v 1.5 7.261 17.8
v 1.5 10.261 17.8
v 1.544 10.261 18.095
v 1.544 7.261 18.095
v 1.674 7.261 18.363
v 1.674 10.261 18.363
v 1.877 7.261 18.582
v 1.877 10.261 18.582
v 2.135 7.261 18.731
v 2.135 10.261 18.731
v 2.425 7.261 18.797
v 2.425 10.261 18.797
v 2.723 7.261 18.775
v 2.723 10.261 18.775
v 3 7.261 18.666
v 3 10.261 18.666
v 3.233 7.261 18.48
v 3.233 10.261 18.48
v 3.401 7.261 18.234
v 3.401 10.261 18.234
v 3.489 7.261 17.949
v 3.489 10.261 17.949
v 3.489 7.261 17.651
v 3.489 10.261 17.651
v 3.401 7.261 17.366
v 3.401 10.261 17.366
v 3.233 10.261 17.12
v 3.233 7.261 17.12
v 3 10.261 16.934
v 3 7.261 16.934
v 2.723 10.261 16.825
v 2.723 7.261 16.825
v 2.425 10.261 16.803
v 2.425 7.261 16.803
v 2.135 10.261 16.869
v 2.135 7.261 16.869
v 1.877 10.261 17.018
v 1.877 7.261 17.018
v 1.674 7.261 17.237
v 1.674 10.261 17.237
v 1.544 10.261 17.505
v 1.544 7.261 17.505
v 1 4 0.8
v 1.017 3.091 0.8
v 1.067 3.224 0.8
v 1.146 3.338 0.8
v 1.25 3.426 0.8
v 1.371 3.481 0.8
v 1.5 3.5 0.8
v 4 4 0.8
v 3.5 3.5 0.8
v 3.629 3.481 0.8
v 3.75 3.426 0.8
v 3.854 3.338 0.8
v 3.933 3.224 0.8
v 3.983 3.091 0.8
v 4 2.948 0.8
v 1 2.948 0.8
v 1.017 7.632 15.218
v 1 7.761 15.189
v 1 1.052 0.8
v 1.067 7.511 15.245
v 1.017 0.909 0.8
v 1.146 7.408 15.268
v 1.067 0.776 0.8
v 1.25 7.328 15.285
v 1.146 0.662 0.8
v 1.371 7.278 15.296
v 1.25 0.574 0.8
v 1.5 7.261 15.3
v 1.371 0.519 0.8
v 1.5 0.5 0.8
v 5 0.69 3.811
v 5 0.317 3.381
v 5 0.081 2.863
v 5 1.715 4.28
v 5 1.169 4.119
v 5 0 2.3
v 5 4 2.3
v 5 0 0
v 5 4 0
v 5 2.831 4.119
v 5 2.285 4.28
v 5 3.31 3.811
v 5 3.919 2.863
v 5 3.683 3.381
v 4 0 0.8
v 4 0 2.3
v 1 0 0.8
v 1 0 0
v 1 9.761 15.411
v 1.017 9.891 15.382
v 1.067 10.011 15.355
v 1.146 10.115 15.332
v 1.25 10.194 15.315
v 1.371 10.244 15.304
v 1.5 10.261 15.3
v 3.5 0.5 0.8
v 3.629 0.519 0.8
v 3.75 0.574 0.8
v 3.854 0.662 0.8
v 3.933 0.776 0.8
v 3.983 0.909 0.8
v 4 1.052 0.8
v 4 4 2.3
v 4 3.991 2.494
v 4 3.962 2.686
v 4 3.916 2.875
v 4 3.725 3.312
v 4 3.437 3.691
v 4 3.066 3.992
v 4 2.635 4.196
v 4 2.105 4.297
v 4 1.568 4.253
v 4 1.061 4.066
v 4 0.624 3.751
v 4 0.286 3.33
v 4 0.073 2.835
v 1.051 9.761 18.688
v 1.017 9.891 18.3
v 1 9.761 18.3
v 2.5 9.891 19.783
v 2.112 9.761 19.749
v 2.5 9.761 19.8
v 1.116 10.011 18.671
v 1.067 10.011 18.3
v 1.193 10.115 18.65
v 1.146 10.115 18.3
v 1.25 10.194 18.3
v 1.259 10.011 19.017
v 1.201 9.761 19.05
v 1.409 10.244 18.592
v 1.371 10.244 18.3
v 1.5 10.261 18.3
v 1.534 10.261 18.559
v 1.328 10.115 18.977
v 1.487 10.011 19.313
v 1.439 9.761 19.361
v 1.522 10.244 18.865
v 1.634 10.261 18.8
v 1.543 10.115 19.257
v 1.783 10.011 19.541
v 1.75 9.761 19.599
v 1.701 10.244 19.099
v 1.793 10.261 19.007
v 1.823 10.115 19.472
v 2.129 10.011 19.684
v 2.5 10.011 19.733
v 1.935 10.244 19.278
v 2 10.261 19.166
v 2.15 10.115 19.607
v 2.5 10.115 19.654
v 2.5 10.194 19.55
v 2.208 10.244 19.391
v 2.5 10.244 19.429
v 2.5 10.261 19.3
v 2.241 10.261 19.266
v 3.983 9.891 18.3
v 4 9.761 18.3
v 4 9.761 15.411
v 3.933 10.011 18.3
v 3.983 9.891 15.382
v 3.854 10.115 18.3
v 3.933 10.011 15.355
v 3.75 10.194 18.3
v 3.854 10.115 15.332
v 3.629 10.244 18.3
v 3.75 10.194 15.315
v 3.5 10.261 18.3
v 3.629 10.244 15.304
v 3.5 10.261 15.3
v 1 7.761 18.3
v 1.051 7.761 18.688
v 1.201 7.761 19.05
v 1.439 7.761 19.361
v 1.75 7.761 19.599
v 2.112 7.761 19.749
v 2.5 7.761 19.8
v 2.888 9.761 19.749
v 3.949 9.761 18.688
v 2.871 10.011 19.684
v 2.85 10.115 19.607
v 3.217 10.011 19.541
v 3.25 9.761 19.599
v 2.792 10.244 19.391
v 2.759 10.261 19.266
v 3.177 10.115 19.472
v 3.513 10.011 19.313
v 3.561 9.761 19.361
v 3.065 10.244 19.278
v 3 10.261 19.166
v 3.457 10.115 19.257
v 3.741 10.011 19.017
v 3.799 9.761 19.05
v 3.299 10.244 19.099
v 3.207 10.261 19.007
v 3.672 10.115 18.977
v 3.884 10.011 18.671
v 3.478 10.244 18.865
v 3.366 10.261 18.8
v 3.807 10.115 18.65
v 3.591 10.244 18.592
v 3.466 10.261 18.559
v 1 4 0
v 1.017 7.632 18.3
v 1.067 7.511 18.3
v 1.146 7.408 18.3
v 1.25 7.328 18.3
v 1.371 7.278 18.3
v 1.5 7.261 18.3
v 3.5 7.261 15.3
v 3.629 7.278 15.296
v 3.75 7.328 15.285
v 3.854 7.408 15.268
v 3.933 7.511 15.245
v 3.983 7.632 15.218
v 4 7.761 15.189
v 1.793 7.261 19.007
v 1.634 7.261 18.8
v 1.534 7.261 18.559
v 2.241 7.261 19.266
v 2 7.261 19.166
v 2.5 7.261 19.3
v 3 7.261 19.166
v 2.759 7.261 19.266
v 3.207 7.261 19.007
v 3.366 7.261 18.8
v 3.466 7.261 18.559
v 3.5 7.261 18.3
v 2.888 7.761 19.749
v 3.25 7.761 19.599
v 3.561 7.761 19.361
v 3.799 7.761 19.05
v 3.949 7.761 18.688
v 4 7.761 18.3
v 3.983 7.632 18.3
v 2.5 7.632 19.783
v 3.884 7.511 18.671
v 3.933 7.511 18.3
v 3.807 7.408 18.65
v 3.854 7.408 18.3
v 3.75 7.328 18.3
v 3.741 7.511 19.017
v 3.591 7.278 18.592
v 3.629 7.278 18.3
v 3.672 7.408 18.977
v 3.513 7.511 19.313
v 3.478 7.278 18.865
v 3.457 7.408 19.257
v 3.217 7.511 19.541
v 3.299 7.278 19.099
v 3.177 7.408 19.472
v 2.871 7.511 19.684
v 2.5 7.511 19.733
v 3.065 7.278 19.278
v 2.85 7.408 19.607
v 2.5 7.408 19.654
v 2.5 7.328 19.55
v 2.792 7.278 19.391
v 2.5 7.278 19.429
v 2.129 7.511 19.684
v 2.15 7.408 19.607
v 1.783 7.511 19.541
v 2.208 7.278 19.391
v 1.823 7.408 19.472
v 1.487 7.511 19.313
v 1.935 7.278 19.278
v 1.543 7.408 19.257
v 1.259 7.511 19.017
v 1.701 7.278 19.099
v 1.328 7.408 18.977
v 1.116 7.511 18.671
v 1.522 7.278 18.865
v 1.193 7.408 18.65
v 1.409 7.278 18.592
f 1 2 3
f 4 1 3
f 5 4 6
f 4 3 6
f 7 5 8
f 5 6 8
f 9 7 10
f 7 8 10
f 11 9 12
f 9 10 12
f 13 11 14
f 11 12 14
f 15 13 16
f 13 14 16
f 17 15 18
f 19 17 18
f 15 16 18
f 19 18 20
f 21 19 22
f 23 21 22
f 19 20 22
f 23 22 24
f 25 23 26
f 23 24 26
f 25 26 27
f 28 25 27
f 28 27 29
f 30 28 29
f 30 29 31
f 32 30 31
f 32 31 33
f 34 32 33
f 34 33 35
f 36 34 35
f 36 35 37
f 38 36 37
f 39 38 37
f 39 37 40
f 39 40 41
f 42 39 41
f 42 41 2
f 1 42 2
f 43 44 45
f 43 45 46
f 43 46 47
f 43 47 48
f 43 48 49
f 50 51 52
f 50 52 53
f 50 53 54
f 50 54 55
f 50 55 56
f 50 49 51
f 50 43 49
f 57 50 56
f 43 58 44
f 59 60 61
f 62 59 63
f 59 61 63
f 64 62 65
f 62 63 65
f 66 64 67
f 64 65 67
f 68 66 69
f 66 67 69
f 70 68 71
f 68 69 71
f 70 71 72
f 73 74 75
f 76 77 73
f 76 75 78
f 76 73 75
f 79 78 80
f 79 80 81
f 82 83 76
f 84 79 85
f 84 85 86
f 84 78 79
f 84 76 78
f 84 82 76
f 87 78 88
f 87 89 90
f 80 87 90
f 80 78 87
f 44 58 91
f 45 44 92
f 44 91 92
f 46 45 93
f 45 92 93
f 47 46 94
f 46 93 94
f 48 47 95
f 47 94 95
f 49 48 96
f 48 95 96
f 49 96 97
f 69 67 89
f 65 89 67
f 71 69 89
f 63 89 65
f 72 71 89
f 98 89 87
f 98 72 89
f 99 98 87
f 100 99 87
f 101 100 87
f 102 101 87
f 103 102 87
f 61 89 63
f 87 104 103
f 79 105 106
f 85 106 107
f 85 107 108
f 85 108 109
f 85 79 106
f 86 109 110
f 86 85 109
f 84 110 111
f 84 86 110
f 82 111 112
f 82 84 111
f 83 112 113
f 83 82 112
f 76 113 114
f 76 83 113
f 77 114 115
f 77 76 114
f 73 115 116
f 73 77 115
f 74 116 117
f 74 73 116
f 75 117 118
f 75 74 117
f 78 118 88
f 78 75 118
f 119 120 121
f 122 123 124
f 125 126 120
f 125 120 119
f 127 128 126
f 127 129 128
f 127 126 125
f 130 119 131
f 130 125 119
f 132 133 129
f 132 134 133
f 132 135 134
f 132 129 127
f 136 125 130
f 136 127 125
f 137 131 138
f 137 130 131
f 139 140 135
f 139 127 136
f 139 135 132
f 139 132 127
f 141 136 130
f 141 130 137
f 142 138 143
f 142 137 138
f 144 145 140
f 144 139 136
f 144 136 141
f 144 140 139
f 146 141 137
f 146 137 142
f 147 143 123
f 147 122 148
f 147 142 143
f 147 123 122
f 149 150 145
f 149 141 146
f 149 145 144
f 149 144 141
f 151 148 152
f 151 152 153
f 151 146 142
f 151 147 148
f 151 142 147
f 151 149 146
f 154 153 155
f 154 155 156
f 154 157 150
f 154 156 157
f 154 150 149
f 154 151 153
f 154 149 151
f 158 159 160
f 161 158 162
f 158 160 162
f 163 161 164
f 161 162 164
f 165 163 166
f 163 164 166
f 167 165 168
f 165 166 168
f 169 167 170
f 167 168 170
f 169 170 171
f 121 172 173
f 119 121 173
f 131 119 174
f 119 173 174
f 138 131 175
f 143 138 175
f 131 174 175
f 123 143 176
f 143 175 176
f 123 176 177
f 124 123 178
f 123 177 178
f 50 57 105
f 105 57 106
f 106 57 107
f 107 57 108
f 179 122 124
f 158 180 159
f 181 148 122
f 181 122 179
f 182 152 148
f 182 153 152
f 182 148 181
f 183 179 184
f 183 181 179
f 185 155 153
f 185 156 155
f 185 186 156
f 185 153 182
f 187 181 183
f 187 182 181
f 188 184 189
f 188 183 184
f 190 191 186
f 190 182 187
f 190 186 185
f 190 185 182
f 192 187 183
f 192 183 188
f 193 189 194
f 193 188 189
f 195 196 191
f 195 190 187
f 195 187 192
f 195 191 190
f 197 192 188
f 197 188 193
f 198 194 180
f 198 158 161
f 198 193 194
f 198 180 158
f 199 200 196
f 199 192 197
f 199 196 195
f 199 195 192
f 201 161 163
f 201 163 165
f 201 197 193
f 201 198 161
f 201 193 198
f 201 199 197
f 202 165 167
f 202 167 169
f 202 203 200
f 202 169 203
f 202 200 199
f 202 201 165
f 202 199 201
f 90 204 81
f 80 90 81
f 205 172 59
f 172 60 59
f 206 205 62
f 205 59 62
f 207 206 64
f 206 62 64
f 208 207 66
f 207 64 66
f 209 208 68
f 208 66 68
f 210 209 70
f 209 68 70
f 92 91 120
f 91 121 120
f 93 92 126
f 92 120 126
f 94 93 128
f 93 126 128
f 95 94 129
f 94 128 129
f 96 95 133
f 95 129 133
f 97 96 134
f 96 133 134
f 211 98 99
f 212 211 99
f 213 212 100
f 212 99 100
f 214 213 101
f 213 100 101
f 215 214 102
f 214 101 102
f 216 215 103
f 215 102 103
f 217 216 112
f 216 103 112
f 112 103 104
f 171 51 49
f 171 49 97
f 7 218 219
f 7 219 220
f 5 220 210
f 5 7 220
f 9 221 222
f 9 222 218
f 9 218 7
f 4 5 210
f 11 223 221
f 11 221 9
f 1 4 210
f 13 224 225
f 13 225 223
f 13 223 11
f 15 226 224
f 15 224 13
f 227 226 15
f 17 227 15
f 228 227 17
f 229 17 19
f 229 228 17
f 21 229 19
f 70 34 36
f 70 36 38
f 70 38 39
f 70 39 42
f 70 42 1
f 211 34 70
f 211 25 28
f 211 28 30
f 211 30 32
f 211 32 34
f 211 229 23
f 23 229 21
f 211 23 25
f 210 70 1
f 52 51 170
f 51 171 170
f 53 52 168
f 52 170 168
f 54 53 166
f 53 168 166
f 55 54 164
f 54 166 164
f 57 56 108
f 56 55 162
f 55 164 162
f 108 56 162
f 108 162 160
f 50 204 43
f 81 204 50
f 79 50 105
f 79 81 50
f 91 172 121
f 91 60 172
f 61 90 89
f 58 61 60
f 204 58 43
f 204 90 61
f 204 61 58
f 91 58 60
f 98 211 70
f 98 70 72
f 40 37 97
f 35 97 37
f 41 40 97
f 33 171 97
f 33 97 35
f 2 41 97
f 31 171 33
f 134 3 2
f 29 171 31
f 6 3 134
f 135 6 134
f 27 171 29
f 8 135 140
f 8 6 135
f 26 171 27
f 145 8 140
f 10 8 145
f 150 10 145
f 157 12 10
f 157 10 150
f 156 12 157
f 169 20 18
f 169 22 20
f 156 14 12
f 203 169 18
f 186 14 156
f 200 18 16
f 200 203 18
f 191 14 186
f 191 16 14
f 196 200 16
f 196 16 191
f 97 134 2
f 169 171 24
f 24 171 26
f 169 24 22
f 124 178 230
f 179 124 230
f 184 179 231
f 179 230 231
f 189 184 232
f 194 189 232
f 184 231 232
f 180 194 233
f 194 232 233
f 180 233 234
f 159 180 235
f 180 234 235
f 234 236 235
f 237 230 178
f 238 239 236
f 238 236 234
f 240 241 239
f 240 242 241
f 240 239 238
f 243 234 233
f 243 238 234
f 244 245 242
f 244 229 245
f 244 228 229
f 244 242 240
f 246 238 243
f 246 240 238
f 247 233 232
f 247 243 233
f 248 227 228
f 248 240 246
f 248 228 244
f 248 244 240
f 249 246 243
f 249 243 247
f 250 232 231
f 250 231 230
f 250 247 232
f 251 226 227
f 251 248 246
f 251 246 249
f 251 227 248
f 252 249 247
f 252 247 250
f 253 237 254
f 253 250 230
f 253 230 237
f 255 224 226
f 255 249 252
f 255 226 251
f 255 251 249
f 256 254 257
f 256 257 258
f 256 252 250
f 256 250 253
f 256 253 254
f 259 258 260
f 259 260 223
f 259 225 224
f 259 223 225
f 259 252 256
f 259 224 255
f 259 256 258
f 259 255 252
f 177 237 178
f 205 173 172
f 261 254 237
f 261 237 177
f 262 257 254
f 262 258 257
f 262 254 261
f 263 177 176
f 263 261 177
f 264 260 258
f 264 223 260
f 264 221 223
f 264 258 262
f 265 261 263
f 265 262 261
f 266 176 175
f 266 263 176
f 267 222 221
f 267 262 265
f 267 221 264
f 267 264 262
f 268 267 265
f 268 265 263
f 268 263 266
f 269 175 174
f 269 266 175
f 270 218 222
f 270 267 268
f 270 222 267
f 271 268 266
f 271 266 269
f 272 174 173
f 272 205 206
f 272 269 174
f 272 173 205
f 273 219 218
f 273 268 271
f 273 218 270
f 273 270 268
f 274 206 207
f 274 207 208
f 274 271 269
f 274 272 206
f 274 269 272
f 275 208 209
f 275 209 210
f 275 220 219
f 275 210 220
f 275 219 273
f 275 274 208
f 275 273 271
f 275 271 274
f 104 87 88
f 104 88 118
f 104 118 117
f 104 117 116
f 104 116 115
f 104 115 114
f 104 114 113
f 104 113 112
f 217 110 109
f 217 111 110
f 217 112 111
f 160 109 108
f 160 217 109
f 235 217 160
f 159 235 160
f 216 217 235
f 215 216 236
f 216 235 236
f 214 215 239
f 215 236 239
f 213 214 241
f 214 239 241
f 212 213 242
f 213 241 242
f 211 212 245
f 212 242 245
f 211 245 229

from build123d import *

# Parameters (mm, degrees)
F0_W      = 4
F0_H      = 4
F1_DEPTH  = 0.8
F4_DEPTH  = 1.5
F5_R      = 1
F6_DEPTH  = 10.2624610432
F7_R      = 1.49999
F8_R      = 0.49999
F10_DEPTH = 1


# Not quite as in the source:
# - a fillet or chamfer is up to 0.001 mm smaller than in the source, because OpenCascade refuses the exact size


with BuildPart() as f1:
    # F0 (on Top) → F1 (new body)
    with BuildSketch(Plane.XY):
        with Locations((3, 2)):
            Rectangle(F0_W, F0_H)
    extrude(amount=F1_DEPTH)

    # F3 (on offset) → F4 (join, symmetric)
    with BuildSketch(Plane.YZ.offset(2.5)):
        Polygon((0.5, 0.8), (3.5, 0.8), (10.2614610432, 15.3), (10.2614610432, 19.8), (7.2614610432, 19.8), (7.2614610432, 15.3), align=None)
    extrude(amount=F4_DEPTH, both=True)

    # F5 (on face) → F6 (cut, through all)
    with BuildSketch(Plane(origin=(0, 10.2614610432, 0), x_dir=(-1, 0, 0), z_dir=(0, 1, 0))):
        with Locations((-2.5, 17.8)):
            Circle(F5_R)
    extrude(amount=-F6_DEPTH, mode=Mode.SUBTRACT)

    # F7 (radius 1.5 in the source; OpenCascade refuses exactly that, so slightly less here)
    f7_edges = [f1.edges().sort_by_distance(p)[0] for p in [
        (1, 8.761461, 19.8),
        (4, 8.761461, 19.8),
    ]]
    fillet(f7_edges, radius=F7_R)

    # F8 (radius 0.5 in the source; OpenCascade refuses exactly that, so slightly less here)
    f8_edges = [f1.edges().sort_by_distance(p)[0] for p in [
        (1, 6.880731, 8.05),
        (1, 10.261461, 16.800005),
        (3.560663, 10.261461, 19.360663),
        (4, 6.880731, 8.05),
        (1, 3.880731, 8.05),
        (1, 7.261461, 16.800005),
        (4, 3.880731, 8.05),
    ]]
    fillet(f8_edges, radius=F8_R)

    # F9 (on face) → F10 (join)
    with BuildSketch(Plane.YZ.offset(5)):
        with BuildLine():
            Line((0, 2.3), (0, 0.8))
            Line((0, 0.8), (4, 0.8))
            Line((4, 0.8), (4, 2.3))
            ThreePointArc((4, 2.3), (2, 4.3), (0, 2.3))
        make_face()
    extrude(amount=-F10_DEPTH)


solid = f1.part
